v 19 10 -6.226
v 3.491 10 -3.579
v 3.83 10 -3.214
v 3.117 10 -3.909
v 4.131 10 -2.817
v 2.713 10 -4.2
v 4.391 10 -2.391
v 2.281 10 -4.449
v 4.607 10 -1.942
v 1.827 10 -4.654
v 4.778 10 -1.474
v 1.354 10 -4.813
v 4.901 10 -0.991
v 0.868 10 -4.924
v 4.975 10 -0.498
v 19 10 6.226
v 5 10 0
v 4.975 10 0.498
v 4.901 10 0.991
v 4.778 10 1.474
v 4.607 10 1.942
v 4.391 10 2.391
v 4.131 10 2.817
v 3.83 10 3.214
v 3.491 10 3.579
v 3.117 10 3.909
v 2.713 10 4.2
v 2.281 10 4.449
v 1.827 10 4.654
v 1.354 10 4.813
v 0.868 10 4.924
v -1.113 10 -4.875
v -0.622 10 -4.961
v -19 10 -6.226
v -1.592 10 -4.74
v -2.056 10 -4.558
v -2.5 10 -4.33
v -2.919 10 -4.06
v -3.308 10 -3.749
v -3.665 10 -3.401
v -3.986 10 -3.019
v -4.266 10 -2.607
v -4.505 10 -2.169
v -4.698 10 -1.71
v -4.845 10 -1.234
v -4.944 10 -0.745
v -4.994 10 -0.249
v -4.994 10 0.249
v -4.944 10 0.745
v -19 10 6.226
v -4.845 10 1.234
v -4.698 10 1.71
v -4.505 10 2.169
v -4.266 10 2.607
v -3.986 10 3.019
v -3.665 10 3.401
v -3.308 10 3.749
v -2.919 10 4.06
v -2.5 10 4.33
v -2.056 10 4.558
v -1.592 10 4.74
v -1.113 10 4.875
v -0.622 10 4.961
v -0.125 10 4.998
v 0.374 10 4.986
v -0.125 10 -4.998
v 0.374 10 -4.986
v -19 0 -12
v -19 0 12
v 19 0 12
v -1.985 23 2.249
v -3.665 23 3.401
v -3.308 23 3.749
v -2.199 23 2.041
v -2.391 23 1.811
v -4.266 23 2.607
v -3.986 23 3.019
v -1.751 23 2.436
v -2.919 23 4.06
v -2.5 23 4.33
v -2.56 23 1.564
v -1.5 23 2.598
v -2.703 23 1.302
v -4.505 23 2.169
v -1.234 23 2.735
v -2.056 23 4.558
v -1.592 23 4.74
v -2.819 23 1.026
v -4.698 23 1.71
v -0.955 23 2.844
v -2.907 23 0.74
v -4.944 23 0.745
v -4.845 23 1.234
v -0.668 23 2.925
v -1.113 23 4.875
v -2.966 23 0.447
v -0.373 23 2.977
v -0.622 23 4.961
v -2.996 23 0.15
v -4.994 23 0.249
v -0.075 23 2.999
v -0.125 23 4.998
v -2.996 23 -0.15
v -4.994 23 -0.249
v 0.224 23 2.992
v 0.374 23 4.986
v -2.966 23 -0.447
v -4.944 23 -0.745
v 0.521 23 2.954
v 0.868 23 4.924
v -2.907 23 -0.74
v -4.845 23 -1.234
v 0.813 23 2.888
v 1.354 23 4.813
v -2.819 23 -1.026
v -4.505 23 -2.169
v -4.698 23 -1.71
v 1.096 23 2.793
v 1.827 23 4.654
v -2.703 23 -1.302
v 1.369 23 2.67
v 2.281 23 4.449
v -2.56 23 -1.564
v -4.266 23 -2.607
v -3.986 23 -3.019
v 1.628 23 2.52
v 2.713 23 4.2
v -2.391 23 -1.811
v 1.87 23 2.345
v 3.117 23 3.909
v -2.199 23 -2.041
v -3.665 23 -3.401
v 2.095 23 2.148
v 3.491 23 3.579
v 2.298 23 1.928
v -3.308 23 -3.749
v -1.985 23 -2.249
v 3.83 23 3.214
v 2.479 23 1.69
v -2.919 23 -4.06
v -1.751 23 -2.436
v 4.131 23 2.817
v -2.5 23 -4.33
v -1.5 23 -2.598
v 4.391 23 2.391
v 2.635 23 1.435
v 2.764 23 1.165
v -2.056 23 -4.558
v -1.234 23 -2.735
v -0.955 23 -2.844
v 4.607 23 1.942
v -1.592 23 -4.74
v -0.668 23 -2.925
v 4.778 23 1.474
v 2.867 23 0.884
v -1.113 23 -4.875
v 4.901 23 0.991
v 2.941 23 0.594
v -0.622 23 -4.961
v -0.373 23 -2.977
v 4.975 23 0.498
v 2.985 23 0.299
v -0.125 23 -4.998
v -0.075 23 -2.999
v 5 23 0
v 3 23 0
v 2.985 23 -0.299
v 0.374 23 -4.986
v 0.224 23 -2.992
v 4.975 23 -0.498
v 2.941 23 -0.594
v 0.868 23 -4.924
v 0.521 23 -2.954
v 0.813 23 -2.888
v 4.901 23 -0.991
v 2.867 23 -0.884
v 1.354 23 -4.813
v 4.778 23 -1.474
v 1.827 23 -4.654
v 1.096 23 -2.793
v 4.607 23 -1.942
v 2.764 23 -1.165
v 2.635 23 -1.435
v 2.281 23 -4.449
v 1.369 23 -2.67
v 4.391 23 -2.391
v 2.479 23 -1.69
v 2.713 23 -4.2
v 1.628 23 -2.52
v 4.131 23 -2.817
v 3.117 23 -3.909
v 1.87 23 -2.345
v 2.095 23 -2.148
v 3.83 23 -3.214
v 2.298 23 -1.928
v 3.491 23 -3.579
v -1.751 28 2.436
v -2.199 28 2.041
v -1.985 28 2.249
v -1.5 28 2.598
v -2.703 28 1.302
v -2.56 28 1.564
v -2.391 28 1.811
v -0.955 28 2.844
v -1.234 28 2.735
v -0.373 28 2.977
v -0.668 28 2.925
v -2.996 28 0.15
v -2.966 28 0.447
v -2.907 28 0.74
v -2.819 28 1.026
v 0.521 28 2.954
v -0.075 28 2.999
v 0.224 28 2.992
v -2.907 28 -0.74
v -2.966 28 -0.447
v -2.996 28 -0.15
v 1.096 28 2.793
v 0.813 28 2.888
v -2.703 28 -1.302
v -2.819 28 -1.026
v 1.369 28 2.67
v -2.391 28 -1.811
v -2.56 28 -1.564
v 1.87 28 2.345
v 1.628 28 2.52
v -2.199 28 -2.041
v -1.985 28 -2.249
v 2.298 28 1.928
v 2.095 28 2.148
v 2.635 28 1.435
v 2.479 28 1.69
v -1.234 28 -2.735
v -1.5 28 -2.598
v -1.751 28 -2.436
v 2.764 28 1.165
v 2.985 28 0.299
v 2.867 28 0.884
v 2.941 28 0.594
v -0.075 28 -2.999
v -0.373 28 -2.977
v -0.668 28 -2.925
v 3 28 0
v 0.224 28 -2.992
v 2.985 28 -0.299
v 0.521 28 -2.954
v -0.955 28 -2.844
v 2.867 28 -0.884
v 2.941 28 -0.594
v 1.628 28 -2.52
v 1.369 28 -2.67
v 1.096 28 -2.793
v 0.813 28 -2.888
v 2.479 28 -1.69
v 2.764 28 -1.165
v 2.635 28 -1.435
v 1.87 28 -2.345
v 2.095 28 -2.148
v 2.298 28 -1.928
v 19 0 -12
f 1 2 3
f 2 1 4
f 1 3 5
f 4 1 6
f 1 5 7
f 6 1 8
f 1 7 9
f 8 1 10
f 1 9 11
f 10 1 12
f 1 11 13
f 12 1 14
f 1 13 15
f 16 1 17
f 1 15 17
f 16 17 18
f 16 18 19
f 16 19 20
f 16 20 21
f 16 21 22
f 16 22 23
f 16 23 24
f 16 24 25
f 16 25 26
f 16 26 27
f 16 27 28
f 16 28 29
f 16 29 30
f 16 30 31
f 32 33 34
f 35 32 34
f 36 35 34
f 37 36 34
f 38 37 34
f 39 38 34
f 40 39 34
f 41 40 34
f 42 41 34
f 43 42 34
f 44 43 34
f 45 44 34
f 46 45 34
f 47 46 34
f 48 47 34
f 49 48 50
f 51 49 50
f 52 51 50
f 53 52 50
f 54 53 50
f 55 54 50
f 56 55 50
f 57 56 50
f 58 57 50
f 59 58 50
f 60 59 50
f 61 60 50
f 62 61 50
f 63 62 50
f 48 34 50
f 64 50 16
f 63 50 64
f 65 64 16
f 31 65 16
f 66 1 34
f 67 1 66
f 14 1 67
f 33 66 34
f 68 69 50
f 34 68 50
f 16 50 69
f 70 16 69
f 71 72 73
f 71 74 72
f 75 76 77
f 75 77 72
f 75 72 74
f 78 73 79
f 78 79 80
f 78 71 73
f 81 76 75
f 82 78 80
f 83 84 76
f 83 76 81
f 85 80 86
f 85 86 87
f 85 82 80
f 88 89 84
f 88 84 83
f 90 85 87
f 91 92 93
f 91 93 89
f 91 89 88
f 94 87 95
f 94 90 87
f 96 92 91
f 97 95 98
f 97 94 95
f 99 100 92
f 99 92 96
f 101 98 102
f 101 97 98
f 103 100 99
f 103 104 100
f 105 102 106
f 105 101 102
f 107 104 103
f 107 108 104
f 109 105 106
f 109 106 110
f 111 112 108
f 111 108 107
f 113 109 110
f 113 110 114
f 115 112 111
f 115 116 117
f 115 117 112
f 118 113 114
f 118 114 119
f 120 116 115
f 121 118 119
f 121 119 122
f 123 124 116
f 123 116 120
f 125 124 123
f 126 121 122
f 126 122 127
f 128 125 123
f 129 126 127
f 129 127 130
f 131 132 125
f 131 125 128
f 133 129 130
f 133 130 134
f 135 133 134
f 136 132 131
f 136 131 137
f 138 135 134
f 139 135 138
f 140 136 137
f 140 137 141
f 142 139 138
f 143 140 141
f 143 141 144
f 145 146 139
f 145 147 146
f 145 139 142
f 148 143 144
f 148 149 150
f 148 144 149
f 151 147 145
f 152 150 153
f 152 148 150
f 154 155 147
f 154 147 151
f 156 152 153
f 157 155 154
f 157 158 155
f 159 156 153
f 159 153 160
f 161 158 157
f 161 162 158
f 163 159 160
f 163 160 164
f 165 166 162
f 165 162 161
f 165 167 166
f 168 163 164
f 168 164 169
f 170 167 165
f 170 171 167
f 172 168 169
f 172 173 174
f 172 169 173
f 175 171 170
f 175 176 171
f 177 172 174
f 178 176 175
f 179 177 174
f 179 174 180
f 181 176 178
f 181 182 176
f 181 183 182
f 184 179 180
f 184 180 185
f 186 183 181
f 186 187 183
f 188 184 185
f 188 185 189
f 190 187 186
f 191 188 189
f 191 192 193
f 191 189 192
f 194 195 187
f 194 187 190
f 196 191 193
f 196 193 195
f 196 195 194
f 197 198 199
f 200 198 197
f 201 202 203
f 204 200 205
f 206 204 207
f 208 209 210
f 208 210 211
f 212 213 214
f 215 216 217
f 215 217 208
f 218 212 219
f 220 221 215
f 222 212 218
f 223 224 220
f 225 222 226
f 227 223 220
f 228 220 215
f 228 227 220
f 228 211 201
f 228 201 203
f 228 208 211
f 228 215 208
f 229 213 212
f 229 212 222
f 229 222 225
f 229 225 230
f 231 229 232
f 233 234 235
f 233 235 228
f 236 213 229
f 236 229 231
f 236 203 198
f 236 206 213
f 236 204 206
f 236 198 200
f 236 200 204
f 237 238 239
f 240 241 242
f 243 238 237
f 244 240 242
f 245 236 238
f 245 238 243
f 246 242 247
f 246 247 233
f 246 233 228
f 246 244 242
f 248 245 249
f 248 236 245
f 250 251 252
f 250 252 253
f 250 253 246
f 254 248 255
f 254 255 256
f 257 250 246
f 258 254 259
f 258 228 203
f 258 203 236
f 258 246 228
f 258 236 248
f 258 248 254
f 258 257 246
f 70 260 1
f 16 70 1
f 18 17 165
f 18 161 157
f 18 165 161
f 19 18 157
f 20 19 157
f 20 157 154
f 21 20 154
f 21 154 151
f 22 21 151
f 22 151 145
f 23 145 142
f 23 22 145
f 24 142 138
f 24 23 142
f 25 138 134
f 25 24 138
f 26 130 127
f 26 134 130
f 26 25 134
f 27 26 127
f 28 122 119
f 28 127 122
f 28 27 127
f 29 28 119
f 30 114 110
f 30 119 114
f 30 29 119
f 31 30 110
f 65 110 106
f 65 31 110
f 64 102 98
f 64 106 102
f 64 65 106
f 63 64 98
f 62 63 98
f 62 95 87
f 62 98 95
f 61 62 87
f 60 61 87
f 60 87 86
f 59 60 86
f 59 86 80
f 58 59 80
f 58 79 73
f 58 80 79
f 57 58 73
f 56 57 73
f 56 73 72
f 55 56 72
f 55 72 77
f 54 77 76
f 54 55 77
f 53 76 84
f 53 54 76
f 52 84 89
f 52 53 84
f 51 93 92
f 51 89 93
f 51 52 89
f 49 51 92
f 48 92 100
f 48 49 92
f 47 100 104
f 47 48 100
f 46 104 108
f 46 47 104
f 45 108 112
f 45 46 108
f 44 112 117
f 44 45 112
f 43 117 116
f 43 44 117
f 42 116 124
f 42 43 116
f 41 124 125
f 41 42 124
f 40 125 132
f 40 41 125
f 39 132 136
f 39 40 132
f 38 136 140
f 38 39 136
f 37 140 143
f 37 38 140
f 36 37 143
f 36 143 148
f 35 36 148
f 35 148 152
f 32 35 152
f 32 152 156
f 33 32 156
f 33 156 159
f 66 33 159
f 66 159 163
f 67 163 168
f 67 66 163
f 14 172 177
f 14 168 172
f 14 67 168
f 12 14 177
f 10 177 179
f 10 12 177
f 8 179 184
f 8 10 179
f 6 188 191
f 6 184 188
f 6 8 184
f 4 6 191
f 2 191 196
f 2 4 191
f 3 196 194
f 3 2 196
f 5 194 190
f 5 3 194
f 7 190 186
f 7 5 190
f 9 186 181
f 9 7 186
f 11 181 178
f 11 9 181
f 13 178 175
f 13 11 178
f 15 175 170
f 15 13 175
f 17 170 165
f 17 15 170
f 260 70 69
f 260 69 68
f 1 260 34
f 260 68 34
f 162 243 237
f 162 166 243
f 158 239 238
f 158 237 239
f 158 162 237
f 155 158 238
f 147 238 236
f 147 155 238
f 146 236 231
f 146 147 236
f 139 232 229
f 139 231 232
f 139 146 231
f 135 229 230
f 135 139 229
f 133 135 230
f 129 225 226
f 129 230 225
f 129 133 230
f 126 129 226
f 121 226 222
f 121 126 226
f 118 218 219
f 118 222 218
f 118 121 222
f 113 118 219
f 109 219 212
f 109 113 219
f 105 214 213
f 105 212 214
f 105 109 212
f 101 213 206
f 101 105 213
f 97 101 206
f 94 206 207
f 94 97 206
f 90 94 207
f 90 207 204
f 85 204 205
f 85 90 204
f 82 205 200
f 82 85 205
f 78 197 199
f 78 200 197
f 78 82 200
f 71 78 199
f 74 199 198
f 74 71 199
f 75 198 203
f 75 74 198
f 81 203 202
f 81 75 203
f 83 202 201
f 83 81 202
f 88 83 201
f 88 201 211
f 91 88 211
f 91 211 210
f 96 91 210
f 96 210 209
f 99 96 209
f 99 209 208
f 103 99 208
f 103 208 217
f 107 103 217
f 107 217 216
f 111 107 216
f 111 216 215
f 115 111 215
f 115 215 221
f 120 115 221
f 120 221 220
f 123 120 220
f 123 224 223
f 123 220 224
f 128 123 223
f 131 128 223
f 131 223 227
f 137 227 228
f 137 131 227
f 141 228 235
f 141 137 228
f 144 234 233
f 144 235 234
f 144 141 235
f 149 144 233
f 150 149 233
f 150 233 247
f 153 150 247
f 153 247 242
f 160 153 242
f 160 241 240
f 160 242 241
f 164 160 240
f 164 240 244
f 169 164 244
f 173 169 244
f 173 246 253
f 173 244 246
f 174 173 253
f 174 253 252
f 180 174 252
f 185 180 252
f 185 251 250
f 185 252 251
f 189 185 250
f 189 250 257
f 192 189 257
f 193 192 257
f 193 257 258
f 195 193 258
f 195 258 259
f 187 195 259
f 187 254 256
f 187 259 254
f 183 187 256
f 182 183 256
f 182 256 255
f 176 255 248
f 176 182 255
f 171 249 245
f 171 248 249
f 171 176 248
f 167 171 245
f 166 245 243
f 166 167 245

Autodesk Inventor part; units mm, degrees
ref_plane "YZ Plane" through (0, 0, 0) normal (1, 0, 0) x (0, 1, 0)
ref_plane "XZ Plane" through (0, 0, 0) normal (0, 1, 0) x (-1, 0, 0)
ref_plane "XY Plane" through (0, 0, 0) normal (0, 0, 1) x (1, 0, 0)
sketch "Sketch4" plane through (0, 0, 0) normal (1, 0, 0) x (0, 1, 0)
  line L0 (0, 0) -> (0, -12)
  line L1 (0, -12) -> (10, -6.2265)
  line L2 (10, -6.2265) -> (10, 6.2265)
  line L3 (10, 6.2265) -> (0, 12)
  line L4 (0, 12) -> (0, 0)
  line L5 (0, 0) -> (10, 0)
  dimension "d31" = 60
  dimension "d32" = 60
  dimension "d33" = 10
  dimension "d34" = 12
extrude "Extrusion3" add sketch "Sketch4" along normal mid plane 38
sketch "Sketch5" plane through (-19, 10, 6.2265) normal (0, 1, 0) x (1, 0, 0)
  circle A0 centre (19, 6.2265) radius 5
  dimension "d37" = 10
extrude "Extrusion4" add sketch "Sketch5" along normal blind 13
sketch "Sketch6" plane through (0, 23, 0) normal (0, 1, 0) x (1, 0, 0)
  circle A0 centre (0, 0) radius 3
  point P0 (0, 0)
  dimension "d40" = 6
extrude "Extrusion5" add sketch "Sketch6" along normal blind 5
properties part number "Sketch" material "Acero inoxidable, austenítico"
